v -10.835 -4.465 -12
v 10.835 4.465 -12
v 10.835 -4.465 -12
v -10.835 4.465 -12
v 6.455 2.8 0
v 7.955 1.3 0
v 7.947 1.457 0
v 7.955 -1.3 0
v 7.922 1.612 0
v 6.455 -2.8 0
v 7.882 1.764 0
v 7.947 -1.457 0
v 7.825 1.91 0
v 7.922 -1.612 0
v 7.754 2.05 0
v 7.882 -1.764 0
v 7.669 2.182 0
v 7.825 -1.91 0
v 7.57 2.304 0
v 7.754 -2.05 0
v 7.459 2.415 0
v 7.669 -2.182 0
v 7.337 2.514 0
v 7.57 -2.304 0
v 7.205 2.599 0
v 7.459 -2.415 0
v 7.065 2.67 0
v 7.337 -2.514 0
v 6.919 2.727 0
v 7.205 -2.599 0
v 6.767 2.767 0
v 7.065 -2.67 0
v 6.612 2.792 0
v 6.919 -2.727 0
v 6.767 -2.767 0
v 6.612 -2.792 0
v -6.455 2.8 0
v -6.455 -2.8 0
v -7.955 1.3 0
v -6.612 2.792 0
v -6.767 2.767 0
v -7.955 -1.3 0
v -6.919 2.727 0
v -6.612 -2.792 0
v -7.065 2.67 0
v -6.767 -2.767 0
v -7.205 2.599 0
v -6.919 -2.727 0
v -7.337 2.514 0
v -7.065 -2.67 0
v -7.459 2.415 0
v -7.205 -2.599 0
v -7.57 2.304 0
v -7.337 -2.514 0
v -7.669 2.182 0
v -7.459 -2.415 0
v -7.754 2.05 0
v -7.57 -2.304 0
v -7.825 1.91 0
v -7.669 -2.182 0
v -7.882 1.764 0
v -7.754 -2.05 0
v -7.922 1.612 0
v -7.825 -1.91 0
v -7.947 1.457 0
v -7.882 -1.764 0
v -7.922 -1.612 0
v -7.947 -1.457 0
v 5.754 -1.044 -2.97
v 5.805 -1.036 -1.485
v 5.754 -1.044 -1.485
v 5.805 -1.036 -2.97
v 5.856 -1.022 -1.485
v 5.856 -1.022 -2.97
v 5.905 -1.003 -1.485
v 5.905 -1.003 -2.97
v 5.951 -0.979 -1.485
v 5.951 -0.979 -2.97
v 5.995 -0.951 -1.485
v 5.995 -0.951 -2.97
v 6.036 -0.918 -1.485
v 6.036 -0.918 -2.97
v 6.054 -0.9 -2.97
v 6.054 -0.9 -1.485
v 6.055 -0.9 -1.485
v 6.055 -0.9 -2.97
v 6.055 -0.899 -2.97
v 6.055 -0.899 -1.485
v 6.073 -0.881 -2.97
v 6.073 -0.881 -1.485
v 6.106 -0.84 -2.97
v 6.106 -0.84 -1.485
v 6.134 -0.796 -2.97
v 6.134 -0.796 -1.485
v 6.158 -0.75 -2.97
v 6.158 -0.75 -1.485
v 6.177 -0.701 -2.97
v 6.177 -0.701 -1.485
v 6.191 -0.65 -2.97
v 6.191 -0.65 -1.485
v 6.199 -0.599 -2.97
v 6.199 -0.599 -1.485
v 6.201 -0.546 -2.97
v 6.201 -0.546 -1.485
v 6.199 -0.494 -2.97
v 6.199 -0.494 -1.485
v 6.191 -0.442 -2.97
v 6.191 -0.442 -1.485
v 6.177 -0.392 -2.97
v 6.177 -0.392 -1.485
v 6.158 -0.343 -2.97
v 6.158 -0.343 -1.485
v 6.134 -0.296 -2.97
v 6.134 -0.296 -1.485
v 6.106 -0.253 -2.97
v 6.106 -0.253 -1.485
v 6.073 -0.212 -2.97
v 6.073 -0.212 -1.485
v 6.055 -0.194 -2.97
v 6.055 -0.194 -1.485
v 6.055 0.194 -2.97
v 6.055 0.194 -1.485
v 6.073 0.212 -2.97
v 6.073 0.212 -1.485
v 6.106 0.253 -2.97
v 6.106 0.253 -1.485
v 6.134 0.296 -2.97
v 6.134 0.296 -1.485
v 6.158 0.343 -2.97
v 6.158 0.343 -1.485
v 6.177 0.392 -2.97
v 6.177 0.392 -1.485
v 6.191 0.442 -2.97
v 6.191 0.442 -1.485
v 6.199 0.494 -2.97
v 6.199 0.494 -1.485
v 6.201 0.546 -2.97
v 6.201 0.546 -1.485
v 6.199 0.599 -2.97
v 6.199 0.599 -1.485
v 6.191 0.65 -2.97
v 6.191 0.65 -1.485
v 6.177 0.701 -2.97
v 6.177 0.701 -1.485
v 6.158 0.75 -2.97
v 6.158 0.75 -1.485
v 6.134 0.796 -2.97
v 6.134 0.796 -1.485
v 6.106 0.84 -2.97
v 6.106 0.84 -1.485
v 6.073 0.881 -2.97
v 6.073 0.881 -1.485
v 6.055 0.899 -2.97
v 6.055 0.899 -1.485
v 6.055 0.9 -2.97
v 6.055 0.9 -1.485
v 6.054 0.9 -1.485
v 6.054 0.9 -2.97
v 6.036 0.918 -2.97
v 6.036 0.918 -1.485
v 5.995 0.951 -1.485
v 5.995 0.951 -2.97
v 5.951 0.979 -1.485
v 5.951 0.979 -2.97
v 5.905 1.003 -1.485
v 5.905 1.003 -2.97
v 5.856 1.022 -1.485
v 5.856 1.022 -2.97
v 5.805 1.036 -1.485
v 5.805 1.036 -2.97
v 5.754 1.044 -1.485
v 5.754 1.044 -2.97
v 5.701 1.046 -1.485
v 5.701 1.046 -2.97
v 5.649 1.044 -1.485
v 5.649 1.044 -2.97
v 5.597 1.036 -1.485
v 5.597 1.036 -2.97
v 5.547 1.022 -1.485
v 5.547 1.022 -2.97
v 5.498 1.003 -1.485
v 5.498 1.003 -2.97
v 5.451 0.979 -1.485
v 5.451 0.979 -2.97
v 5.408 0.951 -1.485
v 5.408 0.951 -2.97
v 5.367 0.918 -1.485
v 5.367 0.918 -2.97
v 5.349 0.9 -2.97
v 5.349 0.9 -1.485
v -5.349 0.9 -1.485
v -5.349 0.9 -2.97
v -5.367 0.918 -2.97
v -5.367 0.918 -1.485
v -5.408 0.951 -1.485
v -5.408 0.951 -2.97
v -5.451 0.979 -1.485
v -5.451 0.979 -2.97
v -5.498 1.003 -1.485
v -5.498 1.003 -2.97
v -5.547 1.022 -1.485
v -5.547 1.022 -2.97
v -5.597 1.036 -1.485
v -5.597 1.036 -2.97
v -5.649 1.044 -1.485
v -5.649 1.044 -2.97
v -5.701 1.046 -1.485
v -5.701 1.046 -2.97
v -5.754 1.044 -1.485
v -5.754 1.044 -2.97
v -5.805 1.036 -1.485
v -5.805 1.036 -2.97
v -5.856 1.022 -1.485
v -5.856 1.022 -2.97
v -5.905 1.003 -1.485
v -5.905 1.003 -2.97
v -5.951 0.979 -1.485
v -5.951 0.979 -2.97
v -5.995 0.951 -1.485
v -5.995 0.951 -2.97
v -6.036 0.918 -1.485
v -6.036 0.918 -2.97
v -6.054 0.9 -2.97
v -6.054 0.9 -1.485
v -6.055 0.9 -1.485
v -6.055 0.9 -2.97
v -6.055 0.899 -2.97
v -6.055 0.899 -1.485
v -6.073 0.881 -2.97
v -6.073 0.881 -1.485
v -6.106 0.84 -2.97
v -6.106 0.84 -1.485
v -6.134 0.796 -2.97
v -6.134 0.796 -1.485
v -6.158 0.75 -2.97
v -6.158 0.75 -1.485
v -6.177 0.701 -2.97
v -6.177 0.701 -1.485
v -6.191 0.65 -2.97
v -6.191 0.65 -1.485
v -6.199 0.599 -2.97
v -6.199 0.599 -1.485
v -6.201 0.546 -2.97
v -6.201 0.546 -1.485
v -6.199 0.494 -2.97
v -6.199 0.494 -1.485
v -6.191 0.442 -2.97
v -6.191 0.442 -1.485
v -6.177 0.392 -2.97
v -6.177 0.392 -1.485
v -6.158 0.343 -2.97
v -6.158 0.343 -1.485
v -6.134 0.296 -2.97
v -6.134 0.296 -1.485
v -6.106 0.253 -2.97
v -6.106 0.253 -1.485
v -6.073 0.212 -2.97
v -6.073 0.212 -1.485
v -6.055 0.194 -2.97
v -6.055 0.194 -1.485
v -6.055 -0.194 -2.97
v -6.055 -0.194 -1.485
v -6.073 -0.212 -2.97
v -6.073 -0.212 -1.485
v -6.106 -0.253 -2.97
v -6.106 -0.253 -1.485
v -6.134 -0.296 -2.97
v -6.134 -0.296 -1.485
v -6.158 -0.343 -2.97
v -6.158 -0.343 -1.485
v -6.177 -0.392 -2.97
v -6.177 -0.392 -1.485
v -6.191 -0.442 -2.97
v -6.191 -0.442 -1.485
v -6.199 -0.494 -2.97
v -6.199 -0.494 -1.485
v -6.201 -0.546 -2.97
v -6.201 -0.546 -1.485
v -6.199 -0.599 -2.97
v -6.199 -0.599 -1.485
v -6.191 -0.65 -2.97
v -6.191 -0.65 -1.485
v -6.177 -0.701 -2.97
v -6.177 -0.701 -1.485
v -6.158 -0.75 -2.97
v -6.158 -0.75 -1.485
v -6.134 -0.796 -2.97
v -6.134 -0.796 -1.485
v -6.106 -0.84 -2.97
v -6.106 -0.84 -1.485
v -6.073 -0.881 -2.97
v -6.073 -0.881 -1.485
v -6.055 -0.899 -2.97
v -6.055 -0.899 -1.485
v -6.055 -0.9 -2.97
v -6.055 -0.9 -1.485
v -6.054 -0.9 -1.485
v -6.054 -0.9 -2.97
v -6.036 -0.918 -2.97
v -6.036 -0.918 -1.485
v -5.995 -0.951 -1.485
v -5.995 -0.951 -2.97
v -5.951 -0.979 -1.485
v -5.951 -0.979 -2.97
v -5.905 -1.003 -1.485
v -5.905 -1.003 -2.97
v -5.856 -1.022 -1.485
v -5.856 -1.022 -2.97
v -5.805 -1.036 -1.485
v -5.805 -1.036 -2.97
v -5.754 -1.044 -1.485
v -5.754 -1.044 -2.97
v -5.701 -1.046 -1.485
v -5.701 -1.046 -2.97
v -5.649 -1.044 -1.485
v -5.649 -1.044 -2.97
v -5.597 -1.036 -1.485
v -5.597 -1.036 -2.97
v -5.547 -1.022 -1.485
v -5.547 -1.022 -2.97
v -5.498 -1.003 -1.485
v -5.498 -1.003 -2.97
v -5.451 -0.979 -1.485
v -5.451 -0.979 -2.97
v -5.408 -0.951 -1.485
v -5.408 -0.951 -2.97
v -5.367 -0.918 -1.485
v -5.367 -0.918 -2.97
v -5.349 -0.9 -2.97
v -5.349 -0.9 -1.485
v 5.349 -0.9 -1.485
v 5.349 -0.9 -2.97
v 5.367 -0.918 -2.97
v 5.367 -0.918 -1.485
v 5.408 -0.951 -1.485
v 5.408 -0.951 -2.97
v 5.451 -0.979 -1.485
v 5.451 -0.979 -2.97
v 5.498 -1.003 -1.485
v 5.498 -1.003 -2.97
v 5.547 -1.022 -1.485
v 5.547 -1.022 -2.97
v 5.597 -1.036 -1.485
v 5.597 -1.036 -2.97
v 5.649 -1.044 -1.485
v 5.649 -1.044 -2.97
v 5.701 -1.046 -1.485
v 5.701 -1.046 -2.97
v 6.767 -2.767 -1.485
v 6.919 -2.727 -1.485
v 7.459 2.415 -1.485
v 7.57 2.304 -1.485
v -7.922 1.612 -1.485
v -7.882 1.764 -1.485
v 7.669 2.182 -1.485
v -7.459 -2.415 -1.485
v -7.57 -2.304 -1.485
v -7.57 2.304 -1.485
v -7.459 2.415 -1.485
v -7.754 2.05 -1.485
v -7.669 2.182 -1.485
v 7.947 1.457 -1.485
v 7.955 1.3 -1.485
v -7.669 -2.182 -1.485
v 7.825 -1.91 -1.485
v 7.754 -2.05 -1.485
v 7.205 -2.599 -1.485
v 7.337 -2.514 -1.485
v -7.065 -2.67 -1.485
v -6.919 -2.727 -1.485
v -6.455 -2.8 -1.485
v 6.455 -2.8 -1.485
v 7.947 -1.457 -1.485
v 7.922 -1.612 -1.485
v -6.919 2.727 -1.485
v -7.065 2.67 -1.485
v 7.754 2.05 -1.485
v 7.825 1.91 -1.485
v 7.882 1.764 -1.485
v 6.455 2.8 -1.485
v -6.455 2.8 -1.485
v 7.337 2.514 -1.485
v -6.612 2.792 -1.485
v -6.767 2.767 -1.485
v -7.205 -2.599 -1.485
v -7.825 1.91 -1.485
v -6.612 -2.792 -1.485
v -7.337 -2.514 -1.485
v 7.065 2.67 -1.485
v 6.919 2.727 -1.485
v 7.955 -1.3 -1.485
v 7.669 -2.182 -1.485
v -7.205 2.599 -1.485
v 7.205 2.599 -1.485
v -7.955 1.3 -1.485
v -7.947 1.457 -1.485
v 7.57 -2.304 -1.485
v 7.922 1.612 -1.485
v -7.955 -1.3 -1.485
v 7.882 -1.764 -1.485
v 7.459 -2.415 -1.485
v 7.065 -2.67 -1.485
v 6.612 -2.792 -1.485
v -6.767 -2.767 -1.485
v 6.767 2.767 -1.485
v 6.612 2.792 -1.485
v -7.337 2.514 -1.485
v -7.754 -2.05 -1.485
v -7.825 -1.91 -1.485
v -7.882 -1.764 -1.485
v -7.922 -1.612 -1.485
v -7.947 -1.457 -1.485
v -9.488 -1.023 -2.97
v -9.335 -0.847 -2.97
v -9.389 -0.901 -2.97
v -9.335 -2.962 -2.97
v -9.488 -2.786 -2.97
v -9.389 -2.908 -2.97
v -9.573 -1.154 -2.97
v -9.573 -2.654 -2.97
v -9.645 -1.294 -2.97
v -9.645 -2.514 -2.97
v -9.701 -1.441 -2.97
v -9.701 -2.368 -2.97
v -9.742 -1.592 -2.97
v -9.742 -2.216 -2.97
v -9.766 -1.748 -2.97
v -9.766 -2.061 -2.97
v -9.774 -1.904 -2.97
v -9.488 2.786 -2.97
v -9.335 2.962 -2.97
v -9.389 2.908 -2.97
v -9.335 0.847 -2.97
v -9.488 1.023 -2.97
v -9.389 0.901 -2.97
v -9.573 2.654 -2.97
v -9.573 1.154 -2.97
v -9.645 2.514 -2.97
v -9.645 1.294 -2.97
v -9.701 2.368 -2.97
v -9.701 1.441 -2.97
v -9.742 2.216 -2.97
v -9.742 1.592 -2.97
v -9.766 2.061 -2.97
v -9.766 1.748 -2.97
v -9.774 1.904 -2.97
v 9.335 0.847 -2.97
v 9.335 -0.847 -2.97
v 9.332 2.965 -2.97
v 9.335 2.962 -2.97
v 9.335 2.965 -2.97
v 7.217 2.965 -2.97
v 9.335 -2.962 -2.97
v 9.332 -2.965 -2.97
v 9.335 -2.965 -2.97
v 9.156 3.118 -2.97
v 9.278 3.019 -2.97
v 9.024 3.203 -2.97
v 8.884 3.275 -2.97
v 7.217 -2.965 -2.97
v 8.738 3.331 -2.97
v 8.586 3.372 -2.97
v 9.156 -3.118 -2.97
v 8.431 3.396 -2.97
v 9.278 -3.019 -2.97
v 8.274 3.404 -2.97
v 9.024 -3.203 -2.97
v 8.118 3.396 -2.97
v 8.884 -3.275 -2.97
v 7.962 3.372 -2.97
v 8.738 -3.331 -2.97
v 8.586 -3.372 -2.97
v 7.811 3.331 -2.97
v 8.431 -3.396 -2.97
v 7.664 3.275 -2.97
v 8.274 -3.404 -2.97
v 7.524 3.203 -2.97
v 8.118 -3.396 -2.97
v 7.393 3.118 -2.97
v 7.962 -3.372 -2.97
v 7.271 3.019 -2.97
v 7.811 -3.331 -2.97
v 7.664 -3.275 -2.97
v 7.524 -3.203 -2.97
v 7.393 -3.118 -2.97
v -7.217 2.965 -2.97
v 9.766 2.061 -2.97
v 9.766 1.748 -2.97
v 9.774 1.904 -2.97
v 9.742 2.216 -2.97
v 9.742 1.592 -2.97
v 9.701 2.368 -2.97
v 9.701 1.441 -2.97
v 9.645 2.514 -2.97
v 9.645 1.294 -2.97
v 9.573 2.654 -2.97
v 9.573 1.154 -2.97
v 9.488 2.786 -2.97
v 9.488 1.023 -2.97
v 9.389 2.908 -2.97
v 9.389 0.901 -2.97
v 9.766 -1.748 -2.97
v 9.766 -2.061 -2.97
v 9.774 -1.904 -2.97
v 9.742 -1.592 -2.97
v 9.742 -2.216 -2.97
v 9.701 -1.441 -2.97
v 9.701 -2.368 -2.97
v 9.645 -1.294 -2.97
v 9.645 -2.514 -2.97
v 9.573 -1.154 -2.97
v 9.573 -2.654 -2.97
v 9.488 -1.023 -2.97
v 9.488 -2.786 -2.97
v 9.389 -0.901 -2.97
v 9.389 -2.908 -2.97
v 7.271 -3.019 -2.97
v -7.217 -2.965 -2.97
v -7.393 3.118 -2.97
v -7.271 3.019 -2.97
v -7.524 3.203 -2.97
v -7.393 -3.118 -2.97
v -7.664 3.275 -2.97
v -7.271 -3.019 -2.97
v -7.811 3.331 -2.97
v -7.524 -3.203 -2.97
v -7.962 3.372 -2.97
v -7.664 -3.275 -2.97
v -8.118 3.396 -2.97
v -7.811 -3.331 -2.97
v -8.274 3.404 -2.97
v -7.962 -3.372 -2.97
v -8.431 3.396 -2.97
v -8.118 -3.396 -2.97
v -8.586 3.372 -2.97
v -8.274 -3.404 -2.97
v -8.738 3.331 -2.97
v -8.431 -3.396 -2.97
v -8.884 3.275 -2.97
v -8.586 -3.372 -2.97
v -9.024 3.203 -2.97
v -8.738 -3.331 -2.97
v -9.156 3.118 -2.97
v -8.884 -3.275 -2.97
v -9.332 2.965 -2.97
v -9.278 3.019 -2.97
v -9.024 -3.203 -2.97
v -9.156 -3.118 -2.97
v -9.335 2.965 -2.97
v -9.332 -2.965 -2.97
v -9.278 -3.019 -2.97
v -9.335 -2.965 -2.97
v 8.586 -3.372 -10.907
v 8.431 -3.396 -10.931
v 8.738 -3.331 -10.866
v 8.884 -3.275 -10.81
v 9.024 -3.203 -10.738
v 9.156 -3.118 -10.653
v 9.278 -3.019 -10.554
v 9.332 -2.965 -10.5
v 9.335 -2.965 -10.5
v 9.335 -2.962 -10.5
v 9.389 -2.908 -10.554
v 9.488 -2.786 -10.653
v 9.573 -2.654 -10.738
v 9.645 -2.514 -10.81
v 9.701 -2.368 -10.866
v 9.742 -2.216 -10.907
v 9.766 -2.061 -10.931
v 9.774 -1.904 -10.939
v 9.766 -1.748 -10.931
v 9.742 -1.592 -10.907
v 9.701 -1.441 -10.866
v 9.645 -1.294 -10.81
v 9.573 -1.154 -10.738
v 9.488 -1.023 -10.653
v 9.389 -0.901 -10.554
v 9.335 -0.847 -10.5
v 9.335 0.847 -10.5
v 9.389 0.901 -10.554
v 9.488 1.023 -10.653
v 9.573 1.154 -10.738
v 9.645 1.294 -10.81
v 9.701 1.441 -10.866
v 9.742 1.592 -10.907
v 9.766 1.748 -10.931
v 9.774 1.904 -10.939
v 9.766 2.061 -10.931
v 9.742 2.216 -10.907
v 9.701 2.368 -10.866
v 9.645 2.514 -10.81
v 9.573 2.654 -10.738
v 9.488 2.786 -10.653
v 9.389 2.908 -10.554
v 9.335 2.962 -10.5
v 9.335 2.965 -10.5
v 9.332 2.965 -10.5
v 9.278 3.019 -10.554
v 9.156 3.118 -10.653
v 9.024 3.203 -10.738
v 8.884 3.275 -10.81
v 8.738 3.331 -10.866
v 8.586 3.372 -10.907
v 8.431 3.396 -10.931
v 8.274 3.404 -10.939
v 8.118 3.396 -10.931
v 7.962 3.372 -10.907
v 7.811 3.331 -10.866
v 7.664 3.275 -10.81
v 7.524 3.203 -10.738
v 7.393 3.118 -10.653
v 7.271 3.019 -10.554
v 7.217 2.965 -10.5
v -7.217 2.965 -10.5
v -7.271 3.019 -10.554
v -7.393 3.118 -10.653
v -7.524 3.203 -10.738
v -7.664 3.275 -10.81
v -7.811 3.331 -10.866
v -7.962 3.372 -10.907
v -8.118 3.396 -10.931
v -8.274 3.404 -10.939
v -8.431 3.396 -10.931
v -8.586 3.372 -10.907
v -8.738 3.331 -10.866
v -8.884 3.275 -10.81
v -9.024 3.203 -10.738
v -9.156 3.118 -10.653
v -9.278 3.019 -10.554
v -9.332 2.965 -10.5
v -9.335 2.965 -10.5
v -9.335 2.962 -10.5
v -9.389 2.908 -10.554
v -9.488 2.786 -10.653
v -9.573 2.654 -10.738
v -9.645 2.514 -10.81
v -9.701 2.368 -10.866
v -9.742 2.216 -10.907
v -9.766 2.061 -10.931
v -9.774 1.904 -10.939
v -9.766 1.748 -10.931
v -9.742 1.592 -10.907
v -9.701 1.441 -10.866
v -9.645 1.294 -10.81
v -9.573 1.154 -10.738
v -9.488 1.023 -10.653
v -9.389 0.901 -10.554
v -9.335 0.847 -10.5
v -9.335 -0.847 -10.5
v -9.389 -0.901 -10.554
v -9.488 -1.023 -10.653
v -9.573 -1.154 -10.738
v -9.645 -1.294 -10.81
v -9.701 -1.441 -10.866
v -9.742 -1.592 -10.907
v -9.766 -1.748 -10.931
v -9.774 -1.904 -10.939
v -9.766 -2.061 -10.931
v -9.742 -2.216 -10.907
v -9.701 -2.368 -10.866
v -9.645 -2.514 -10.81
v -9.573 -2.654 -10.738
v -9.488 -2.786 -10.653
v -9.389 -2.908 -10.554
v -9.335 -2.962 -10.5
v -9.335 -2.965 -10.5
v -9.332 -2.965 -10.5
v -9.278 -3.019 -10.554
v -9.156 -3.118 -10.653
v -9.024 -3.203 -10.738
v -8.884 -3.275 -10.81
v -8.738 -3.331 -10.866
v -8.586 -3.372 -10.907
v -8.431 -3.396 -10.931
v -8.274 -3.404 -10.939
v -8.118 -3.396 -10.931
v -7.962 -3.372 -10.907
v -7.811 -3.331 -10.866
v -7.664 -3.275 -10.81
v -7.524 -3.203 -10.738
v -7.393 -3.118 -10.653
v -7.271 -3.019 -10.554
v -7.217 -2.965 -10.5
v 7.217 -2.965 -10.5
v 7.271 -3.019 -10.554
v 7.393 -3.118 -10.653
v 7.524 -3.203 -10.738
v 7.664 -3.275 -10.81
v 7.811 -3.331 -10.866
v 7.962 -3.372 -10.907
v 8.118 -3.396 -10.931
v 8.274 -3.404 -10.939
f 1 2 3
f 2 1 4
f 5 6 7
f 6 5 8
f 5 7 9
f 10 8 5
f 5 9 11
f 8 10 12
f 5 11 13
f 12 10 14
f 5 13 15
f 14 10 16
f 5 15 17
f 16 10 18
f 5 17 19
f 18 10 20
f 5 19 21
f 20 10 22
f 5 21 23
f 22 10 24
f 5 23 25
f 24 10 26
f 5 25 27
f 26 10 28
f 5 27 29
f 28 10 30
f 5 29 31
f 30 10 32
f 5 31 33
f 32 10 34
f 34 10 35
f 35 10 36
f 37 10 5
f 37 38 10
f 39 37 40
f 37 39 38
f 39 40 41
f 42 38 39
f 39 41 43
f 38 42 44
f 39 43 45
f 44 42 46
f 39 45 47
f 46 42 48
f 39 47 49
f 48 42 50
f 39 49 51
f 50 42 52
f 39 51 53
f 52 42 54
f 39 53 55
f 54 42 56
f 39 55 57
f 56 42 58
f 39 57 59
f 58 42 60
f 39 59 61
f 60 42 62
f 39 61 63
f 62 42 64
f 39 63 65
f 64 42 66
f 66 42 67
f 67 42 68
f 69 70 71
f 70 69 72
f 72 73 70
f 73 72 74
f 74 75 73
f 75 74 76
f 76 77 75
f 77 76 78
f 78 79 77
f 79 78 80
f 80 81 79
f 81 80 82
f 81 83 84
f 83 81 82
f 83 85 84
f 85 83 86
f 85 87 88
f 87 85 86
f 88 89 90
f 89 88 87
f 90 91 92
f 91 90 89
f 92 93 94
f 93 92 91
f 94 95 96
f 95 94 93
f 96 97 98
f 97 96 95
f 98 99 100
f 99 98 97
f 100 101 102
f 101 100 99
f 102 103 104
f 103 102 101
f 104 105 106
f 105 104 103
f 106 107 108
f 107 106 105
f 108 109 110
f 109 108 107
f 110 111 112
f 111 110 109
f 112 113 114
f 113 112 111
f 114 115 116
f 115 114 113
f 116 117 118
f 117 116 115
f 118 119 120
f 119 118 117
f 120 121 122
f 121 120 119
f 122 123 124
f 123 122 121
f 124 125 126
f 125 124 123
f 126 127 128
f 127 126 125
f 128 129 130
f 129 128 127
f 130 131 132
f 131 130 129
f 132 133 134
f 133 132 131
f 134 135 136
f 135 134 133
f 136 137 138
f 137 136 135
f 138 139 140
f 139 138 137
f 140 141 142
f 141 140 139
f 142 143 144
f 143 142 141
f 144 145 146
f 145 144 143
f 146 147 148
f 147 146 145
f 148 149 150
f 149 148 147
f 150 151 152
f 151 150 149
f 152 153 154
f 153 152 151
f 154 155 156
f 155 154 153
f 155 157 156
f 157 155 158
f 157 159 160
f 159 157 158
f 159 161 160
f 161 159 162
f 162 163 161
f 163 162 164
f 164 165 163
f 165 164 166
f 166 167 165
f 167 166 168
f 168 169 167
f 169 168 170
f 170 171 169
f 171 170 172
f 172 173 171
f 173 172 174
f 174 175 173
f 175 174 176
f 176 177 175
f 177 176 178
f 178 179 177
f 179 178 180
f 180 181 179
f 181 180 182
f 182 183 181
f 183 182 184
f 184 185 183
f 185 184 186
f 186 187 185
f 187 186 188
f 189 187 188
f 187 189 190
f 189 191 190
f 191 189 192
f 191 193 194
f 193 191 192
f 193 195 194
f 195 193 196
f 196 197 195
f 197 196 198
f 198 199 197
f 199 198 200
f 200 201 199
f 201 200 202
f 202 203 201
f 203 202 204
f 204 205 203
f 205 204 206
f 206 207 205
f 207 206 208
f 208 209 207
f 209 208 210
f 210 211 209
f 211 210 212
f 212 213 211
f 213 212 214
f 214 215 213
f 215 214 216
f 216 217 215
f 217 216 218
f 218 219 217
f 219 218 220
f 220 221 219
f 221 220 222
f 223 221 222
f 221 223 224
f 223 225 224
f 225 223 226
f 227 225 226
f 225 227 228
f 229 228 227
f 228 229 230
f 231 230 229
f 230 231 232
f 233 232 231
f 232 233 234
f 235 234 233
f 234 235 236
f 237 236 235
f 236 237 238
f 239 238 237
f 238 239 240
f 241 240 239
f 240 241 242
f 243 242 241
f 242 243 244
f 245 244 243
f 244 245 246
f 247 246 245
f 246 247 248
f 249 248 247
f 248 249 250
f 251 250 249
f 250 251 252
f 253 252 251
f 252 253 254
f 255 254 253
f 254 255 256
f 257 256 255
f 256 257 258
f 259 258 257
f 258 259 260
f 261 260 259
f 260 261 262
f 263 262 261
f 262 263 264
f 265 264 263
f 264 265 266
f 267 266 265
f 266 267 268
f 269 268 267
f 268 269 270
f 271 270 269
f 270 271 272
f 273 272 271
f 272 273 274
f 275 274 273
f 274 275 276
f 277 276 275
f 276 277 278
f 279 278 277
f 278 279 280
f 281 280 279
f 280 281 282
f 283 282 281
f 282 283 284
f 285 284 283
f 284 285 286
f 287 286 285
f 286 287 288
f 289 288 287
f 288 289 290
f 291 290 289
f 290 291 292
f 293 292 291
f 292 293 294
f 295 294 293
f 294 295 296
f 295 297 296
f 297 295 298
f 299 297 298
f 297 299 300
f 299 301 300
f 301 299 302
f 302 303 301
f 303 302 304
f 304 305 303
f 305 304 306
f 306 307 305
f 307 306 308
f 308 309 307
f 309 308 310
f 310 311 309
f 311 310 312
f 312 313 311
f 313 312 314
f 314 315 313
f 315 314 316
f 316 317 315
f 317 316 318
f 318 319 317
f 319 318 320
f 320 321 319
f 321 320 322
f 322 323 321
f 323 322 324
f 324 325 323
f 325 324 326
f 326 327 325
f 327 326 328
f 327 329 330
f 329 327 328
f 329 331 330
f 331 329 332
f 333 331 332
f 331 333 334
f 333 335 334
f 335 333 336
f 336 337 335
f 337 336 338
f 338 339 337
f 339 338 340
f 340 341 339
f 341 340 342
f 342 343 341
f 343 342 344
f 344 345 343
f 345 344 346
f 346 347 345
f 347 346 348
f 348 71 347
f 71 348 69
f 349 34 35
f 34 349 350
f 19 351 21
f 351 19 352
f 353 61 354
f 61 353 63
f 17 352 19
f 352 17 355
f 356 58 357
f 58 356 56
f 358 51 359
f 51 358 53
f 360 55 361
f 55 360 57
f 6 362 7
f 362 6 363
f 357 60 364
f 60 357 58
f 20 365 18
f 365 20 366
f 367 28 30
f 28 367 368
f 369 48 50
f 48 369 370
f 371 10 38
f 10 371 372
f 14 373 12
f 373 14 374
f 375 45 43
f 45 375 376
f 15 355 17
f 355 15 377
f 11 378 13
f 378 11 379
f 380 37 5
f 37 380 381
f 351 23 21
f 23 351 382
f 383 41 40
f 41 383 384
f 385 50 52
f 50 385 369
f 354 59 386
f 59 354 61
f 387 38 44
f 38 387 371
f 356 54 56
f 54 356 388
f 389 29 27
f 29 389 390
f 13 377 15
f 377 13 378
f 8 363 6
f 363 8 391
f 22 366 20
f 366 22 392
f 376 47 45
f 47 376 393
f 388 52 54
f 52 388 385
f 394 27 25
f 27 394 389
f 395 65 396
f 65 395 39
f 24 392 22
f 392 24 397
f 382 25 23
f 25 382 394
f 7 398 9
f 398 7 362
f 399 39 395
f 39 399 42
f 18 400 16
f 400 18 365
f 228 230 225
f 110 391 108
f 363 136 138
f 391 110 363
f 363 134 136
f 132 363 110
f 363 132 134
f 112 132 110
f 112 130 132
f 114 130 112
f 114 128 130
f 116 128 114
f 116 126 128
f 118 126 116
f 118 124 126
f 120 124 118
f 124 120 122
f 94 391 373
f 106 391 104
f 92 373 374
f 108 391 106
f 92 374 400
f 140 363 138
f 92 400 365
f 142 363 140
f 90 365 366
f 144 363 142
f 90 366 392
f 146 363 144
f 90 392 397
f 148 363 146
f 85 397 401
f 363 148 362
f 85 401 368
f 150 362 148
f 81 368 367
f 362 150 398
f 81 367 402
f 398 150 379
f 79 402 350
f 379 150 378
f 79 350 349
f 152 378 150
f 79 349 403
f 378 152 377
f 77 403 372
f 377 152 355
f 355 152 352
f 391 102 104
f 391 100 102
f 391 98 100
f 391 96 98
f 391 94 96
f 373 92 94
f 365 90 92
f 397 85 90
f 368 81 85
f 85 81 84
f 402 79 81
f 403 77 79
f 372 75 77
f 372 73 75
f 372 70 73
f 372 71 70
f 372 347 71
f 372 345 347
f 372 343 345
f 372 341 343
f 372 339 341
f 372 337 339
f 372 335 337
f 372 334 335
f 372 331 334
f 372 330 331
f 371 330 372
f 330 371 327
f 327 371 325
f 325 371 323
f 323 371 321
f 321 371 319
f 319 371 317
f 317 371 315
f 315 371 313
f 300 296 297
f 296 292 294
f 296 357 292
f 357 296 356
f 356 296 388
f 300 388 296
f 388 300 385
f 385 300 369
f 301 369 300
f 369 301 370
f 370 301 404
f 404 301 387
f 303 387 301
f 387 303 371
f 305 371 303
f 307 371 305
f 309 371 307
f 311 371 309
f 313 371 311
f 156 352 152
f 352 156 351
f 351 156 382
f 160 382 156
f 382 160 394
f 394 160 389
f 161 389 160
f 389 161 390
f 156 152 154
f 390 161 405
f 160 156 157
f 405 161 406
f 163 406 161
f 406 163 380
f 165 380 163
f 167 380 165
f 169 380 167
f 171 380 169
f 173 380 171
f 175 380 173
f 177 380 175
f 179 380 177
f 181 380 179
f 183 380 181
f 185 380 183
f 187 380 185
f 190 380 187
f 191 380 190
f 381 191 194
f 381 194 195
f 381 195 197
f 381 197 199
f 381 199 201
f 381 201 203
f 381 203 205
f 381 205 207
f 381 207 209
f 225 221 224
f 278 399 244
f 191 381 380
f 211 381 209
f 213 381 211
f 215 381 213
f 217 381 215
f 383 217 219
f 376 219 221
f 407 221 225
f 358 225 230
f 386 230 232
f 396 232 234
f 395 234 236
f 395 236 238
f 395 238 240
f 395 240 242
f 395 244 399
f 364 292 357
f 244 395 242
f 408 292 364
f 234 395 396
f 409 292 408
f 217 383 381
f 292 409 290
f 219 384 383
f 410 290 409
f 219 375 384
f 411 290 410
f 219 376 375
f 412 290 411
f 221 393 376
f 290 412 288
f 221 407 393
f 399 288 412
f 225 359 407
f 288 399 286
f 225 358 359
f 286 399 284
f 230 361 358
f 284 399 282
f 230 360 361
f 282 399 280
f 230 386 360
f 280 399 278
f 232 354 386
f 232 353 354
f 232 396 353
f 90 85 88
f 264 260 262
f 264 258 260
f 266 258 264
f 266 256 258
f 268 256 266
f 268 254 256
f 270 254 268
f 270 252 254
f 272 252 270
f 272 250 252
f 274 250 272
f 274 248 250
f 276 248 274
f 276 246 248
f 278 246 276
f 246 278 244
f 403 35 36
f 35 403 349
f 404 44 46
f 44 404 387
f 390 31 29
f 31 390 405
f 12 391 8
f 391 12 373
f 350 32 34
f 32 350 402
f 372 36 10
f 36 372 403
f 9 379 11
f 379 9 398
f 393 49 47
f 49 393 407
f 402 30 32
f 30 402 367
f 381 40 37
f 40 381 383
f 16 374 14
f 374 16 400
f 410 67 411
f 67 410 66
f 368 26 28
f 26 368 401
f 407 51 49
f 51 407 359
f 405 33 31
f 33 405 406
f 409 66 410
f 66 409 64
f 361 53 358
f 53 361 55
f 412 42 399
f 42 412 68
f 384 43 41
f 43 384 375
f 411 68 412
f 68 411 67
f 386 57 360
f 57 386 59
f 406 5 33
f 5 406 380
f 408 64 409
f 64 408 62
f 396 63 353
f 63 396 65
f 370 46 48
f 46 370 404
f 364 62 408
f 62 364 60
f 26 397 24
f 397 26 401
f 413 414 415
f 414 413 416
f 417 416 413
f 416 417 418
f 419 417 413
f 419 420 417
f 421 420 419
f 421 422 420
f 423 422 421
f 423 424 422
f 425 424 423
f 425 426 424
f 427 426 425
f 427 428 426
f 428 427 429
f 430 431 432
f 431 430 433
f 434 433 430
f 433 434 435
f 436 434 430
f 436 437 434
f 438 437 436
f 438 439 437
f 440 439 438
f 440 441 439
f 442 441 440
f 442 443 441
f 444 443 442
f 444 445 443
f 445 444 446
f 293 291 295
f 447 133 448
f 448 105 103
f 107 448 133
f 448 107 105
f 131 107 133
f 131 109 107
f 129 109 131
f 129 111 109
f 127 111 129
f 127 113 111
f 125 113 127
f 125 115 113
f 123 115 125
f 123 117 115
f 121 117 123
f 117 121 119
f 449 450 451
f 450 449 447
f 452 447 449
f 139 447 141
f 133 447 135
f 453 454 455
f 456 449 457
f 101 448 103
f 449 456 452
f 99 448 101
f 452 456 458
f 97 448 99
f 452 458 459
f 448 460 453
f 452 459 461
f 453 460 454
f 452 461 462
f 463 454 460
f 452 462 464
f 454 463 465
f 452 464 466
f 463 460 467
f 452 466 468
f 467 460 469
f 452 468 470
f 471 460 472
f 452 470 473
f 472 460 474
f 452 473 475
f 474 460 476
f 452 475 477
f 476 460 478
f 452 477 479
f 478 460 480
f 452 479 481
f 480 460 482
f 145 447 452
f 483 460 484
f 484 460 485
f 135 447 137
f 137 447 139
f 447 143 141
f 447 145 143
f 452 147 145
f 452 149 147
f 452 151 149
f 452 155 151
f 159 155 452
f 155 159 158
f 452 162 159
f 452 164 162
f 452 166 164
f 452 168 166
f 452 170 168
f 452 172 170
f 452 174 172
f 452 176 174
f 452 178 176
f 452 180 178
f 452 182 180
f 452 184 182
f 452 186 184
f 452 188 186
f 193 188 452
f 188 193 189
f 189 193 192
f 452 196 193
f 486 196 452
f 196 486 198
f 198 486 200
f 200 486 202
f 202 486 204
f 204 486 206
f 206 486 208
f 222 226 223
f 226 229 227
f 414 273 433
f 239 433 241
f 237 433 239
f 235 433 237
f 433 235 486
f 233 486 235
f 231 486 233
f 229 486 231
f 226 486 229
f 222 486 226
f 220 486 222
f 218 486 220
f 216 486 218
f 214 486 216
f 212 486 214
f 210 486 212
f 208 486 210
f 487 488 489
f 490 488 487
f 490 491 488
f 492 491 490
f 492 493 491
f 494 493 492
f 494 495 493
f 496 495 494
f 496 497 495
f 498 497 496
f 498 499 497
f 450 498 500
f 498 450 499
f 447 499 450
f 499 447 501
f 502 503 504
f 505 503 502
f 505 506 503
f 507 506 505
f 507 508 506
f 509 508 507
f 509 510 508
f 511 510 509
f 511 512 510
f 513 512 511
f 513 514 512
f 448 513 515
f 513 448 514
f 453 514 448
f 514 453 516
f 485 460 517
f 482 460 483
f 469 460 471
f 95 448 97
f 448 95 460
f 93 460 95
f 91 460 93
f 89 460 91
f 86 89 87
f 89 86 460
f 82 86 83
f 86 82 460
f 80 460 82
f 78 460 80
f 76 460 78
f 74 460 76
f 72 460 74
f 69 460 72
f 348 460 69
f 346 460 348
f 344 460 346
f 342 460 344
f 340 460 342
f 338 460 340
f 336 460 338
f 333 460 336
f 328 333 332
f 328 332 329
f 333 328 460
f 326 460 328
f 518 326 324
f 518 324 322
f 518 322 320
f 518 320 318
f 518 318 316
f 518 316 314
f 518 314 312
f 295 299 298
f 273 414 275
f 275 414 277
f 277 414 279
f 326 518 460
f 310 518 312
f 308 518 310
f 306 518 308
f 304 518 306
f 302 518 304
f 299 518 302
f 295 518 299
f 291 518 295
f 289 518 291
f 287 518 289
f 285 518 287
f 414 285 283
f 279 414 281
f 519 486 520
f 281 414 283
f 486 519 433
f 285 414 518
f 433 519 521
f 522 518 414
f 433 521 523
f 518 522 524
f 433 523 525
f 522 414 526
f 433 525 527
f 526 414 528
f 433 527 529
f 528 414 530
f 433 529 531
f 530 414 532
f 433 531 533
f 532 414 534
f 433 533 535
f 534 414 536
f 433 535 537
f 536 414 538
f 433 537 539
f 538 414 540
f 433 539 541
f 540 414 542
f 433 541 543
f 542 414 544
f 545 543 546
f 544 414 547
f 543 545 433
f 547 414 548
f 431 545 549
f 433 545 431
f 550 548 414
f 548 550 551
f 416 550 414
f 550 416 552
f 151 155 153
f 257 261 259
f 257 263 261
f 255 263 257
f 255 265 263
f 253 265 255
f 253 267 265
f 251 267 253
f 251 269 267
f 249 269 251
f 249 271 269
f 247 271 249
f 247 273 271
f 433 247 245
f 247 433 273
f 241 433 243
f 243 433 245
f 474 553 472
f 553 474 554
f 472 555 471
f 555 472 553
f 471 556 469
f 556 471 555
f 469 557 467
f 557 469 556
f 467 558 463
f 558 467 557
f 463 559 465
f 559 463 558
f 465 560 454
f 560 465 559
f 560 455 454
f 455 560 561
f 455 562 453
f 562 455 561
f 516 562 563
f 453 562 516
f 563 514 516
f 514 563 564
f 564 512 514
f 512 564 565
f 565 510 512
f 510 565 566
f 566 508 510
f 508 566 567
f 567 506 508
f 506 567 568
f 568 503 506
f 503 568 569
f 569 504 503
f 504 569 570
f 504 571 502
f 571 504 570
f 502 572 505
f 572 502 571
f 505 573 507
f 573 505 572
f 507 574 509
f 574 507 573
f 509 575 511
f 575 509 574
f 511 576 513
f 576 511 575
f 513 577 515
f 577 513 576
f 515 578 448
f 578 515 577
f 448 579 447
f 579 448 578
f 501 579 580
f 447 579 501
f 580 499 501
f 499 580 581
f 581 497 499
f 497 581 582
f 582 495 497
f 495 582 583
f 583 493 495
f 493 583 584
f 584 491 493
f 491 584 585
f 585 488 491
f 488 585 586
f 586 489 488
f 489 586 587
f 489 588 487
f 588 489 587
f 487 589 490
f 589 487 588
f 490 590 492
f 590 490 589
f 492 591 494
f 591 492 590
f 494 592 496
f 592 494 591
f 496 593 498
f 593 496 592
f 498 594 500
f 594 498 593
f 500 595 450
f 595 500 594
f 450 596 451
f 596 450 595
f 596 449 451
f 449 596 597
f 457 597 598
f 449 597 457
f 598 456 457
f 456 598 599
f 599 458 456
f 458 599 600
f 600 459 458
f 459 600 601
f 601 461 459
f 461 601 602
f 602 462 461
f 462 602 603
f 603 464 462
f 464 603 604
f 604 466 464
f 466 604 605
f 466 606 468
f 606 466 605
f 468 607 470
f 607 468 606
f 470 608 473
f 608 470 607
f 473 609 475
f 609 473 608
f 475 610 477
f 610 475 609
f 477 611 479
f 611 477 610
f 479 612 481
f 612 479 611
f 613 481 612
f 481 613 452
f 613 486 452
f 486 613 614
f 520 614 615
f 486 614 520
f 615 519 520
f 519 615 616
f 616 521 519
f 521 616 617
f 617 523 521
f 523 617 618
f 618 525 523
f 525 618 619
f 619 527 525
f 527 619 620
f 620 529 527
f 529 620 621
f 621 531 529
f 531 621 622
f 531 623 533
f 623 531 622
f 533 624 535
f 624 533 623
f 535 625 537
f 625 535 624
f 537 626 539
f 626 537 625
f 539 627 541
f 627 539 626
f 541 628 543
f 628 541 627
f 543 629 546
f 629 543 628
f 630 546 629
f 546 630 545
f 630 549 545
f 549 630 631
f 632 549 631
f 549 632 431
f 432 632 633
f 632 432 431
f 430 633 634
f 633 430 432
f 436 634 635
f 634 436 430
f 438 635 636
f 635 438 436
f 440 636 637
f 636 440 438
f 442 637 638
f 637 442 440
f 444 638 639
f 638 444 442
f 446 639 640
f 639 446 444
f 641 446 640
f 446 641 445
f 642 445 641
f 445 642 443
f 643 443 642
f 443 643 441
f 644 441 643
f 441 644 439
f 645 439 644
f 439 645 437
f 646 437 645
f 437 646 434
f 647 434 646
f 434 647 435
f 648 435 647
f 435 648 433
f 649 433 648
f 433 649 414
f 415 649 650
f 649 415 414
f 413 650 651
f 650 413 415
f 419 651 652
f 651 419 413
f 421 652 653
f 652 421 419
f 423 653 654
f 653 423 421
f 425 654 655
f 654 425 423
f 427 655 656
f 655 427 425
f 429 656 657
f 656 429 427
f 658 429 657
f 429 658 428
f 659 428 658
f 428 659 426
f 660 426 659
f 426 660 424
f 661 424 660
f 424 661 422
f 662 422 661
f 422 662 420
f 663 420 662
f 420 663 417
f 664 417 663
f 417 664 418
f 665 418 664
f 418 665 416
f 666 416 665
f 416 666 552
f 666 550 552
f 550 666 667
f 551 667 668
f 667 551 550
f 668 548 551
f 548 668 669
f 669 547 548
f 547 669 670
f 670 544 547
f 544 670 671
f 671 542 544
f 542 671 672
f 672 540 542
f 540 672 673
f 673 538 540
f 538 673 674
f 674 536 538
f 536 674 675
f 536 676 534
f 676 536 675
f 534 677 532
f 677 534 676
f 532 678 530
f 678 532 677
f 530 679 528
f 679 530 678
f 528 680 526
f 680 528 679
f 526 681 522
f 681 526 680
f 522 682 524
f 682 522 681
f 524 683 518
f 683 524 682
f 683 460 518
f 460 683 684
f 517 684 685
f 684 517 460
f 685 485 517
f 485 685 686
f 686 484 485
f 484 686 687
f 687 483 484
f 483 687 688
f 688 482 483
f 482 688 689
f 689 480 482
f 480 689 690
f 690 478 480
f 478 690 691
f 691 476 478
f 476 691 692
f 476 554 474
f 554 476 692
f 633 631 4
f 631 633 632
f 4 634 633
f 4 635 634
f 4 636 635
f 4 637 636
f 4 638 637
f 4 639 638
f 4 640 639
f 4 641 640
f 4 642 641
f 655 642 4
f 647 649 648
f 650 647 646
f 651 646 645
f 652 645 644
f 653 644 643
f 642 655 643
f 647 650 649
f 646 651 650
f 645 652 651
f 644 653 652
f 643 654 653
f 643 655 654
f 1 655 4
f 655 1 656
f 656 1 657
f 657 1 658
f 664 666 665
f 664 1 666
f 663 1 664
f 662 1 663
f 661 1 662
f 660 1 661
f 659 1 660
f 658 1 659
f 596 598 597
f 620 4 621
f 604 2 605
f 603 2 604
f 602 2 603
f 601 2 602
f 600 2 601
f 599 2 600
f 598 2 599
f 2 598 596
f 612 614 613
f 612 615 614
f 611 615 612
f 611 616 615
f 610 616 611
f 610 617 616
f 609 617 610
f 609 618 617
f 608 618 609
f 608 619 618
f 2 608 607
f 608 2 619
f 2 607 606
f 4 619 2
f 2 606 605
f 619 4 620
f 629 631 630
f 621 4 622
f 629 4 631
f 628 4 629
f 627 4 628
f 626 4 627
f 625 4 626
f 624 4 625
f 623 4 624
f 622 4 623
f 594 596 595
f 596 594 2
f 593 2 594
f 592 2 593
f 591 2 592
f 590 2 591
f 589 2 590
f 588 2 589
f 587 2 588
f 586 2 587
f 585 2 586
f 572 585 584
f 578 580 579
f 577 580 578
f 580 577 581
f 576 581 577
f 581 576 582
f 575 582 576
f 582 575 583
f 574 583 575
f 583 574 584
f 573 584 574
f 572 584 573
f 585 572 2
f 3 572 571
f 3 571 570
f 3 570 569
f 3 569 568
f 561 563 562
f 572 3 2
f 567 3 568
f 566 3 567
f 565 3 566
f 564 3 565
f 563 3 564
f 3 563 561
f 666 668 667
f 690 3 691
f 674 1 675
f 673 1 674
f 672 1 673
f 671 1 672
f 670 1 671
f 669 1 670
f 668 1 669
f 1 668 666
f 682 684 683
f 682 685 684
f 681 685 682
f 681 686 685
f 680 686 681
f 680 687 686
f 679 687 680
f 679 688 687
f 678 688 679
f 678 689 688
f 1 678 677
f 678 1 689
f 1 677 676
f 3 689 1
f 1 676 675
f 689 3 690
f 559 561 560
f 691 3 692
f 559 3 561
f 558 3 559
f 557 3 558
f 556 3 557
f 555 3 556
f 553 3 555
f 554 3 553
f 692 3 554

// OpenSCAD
$fn = 60;


// kinda like the built-in square() function except it will produce rounded corners with radius r
// drill=true means the corners will be drilled out
module square_rounded(size, r=1, drill=false, center=true){
    offsetx =   center ? 0 : size[0]/2 ;
    offsety =   center ? 0 : size[1]/2 ;
    translate([offsetx, offsety, 0]){
        if (drill == false){
            difference(){// subtract away the corners to get rounds
                square(size, center=true);
                translate([size[0]/2-r,size[1]/2-r,0]) difference(){
                    translate([0,0,0]) square([r,r]);
                    circle(r=r);
                }
                translate([-size[0]/2+r,-size[1]/2+r,0]) difference(){
                    translate([-r,-r,0]) square([r,r]);
                    circle(r=r);
                }
                translate([-size[0]/2+r,size[1]/2-r,0]) difference(){
                    translate([-r,0,0]) square([r,r]);
                    circle(r=r);
                }
                translate([size[0]/2-r,-size[1]/2+r,0]) difference(){
                    translate([0,-r,0]) square([r,r]);
                    circle(r=r);
                }
            }
        } else { // drill is true
            union(){
                square(size, center=true);
                translate([size[0]/2-r/sqrt(2), size[1]/2-r/sqrt(2)]) circle(r=r);
                translate([-size[0]/2+r/sqrt(2), -size[1]/2+r/sqrt(2)]) circle(r=r);
                translate([-size[0]/2+r/sqrt(2), size[1]/2-r/sqrt(2)]) circle(r=r);
                translate([size[0]/2-r/sqrt(2), -size[1]/2+r/sqrt(2)]) circle(r=r);
            }
        } // end drill or not
    } // end translate
} // end module

// produces a shape to be subtracted from a plate for the PCB card-edge passthrough at [0,0,0]
// t = plate thickness

// rows = number of rows of the samtec MECF-DV connector we'll make a pocket for (must be 8 or 20)
// con_clearance = clearance between mated connector and pocket on all sides
// r = tool radius
// r_pcb = PCB slot tool radius
// gp_buffer = glue pocket buffer space around PCB
// pcb_t = PCB tab thickness
// pcb_clearance = clearance around PCB in its slot
// length for allignment fillets
module card_edge_passthrough(rows=8, con_clearance=0.10, t=12, r=1.5, gp_buffer=2, pcb_t=1.6, r_pcb=0.5, pcb_clearance=0.1, fillet_length=1.5){
    connector_height=8.78+0.15; //mm SAMTEC MECF-XX-01-L-DV-NP-WT (worst case (largest) size)
    connector_width=5.6+0.13; //mm SAMTEC MECF-XX-01-L-DV-NP-WT (worst case (largest) size)

    con_len = (rows==8)?18.34+0.13:(rows==20)?33.58+0.13:NaN;
    pcb_len = (rows==8)?11.91:(rows==20)?27.15:NaN;

    // calculate connector pocket corner coordinates
    cp_len = con_len+2*con_clearance; // length of connector pocket
    cp_width = connector_width+2*con_clearance; // width of connector pocket
    con_cornerA = [cp_len/2, cp_width/2];
    con_cornerB = [-cp_len/2, -cp_width/2];
    con_cornerC = [-cp_len/2, cp_width/2];
    con_cornerD = [cp_len/2, -cp_width/2];
    
    // calculations for fillet polyhedron thing
    fillet_corner0 = [con_cornerB[0] - fillet_length, con_cornerB[1] - fillet_length, -t];
    fillet_corner1 = [con_cornerC[0] - fillet_length, con_cornerC[1] + fillet_length, -t];
    fillet_corner2 = [con_cornerA[0] + fillet_length, con_cornerA[1] + fillet_length, -t];
    fillet_corner3 = [con_cornerD[0] + fillet_length, con_cornerD[1] - fillet_length, -t];
    fillet_corner4 = [con_cornerB[0], con_cornerB[1], -t + fillet_length];
    fillet_corner5 = [con_cornerC[0], con_cornerC[1], -t + fillet_length];
    fillet_corner6 = [con_cornerA[0], con_cornerA[1], -t + fillet_length];
    fillet_corner7 = [con_cornerD[0], con_cornerD[1], -t + fillet_length];
    p_points =[ fillet_corner0, fillet_corner1, fillet_corner2, fillet_corner3, fillet_corner4, fillet_corner5, fillet_corner6, fillet_corner7 ];
    p_faces = [ [0,1,2,3], [4,5,1,0], [7,6,5,4], [5,6,2,1], [6,7,3,2], [7,4,0,3] ];
    
    // calculate some glue pocket parameters
    above_connector = t-connector_height-con_clearance; // space above the connector pocket
    echo(above_connector);
    gp_width = 2*gp_buffer + pcb_t; // width of glue pocket
    gp_len = 2*gp_buffer + pcb_len; // length of glue pocket
    glue_pocket_depth = above_connector/2; // depth of glue pocket
    
    union(){
        // fabricate the board slot
        translate([0,0,-t]) linear_extrude(t) square_rounded([pcb_len+2*pcb_clearance, pcb_t+2*pcb_clearance], r=r_pcb, drill=true);
        
        // fabricate the rounded corner glue pocket
        translate([0,0,-glue_pocket_depth]) linear_extrude(glue_pocket_depth) square_rounded([gp_len, gp_width], r=r);
        
        // fabricate connector socket well with drilled corners
        translate([0,0,-t]) linear_extrude(connector_height+con_clearance) square_rounded([cp_len, cp_width], r=r, drill=true);
        
        // fabriate fillet guide base
        polyhedron( points=p_points, faces=p_faces);
    } // end union top level union
} // end module


card_edge_passthrough();
